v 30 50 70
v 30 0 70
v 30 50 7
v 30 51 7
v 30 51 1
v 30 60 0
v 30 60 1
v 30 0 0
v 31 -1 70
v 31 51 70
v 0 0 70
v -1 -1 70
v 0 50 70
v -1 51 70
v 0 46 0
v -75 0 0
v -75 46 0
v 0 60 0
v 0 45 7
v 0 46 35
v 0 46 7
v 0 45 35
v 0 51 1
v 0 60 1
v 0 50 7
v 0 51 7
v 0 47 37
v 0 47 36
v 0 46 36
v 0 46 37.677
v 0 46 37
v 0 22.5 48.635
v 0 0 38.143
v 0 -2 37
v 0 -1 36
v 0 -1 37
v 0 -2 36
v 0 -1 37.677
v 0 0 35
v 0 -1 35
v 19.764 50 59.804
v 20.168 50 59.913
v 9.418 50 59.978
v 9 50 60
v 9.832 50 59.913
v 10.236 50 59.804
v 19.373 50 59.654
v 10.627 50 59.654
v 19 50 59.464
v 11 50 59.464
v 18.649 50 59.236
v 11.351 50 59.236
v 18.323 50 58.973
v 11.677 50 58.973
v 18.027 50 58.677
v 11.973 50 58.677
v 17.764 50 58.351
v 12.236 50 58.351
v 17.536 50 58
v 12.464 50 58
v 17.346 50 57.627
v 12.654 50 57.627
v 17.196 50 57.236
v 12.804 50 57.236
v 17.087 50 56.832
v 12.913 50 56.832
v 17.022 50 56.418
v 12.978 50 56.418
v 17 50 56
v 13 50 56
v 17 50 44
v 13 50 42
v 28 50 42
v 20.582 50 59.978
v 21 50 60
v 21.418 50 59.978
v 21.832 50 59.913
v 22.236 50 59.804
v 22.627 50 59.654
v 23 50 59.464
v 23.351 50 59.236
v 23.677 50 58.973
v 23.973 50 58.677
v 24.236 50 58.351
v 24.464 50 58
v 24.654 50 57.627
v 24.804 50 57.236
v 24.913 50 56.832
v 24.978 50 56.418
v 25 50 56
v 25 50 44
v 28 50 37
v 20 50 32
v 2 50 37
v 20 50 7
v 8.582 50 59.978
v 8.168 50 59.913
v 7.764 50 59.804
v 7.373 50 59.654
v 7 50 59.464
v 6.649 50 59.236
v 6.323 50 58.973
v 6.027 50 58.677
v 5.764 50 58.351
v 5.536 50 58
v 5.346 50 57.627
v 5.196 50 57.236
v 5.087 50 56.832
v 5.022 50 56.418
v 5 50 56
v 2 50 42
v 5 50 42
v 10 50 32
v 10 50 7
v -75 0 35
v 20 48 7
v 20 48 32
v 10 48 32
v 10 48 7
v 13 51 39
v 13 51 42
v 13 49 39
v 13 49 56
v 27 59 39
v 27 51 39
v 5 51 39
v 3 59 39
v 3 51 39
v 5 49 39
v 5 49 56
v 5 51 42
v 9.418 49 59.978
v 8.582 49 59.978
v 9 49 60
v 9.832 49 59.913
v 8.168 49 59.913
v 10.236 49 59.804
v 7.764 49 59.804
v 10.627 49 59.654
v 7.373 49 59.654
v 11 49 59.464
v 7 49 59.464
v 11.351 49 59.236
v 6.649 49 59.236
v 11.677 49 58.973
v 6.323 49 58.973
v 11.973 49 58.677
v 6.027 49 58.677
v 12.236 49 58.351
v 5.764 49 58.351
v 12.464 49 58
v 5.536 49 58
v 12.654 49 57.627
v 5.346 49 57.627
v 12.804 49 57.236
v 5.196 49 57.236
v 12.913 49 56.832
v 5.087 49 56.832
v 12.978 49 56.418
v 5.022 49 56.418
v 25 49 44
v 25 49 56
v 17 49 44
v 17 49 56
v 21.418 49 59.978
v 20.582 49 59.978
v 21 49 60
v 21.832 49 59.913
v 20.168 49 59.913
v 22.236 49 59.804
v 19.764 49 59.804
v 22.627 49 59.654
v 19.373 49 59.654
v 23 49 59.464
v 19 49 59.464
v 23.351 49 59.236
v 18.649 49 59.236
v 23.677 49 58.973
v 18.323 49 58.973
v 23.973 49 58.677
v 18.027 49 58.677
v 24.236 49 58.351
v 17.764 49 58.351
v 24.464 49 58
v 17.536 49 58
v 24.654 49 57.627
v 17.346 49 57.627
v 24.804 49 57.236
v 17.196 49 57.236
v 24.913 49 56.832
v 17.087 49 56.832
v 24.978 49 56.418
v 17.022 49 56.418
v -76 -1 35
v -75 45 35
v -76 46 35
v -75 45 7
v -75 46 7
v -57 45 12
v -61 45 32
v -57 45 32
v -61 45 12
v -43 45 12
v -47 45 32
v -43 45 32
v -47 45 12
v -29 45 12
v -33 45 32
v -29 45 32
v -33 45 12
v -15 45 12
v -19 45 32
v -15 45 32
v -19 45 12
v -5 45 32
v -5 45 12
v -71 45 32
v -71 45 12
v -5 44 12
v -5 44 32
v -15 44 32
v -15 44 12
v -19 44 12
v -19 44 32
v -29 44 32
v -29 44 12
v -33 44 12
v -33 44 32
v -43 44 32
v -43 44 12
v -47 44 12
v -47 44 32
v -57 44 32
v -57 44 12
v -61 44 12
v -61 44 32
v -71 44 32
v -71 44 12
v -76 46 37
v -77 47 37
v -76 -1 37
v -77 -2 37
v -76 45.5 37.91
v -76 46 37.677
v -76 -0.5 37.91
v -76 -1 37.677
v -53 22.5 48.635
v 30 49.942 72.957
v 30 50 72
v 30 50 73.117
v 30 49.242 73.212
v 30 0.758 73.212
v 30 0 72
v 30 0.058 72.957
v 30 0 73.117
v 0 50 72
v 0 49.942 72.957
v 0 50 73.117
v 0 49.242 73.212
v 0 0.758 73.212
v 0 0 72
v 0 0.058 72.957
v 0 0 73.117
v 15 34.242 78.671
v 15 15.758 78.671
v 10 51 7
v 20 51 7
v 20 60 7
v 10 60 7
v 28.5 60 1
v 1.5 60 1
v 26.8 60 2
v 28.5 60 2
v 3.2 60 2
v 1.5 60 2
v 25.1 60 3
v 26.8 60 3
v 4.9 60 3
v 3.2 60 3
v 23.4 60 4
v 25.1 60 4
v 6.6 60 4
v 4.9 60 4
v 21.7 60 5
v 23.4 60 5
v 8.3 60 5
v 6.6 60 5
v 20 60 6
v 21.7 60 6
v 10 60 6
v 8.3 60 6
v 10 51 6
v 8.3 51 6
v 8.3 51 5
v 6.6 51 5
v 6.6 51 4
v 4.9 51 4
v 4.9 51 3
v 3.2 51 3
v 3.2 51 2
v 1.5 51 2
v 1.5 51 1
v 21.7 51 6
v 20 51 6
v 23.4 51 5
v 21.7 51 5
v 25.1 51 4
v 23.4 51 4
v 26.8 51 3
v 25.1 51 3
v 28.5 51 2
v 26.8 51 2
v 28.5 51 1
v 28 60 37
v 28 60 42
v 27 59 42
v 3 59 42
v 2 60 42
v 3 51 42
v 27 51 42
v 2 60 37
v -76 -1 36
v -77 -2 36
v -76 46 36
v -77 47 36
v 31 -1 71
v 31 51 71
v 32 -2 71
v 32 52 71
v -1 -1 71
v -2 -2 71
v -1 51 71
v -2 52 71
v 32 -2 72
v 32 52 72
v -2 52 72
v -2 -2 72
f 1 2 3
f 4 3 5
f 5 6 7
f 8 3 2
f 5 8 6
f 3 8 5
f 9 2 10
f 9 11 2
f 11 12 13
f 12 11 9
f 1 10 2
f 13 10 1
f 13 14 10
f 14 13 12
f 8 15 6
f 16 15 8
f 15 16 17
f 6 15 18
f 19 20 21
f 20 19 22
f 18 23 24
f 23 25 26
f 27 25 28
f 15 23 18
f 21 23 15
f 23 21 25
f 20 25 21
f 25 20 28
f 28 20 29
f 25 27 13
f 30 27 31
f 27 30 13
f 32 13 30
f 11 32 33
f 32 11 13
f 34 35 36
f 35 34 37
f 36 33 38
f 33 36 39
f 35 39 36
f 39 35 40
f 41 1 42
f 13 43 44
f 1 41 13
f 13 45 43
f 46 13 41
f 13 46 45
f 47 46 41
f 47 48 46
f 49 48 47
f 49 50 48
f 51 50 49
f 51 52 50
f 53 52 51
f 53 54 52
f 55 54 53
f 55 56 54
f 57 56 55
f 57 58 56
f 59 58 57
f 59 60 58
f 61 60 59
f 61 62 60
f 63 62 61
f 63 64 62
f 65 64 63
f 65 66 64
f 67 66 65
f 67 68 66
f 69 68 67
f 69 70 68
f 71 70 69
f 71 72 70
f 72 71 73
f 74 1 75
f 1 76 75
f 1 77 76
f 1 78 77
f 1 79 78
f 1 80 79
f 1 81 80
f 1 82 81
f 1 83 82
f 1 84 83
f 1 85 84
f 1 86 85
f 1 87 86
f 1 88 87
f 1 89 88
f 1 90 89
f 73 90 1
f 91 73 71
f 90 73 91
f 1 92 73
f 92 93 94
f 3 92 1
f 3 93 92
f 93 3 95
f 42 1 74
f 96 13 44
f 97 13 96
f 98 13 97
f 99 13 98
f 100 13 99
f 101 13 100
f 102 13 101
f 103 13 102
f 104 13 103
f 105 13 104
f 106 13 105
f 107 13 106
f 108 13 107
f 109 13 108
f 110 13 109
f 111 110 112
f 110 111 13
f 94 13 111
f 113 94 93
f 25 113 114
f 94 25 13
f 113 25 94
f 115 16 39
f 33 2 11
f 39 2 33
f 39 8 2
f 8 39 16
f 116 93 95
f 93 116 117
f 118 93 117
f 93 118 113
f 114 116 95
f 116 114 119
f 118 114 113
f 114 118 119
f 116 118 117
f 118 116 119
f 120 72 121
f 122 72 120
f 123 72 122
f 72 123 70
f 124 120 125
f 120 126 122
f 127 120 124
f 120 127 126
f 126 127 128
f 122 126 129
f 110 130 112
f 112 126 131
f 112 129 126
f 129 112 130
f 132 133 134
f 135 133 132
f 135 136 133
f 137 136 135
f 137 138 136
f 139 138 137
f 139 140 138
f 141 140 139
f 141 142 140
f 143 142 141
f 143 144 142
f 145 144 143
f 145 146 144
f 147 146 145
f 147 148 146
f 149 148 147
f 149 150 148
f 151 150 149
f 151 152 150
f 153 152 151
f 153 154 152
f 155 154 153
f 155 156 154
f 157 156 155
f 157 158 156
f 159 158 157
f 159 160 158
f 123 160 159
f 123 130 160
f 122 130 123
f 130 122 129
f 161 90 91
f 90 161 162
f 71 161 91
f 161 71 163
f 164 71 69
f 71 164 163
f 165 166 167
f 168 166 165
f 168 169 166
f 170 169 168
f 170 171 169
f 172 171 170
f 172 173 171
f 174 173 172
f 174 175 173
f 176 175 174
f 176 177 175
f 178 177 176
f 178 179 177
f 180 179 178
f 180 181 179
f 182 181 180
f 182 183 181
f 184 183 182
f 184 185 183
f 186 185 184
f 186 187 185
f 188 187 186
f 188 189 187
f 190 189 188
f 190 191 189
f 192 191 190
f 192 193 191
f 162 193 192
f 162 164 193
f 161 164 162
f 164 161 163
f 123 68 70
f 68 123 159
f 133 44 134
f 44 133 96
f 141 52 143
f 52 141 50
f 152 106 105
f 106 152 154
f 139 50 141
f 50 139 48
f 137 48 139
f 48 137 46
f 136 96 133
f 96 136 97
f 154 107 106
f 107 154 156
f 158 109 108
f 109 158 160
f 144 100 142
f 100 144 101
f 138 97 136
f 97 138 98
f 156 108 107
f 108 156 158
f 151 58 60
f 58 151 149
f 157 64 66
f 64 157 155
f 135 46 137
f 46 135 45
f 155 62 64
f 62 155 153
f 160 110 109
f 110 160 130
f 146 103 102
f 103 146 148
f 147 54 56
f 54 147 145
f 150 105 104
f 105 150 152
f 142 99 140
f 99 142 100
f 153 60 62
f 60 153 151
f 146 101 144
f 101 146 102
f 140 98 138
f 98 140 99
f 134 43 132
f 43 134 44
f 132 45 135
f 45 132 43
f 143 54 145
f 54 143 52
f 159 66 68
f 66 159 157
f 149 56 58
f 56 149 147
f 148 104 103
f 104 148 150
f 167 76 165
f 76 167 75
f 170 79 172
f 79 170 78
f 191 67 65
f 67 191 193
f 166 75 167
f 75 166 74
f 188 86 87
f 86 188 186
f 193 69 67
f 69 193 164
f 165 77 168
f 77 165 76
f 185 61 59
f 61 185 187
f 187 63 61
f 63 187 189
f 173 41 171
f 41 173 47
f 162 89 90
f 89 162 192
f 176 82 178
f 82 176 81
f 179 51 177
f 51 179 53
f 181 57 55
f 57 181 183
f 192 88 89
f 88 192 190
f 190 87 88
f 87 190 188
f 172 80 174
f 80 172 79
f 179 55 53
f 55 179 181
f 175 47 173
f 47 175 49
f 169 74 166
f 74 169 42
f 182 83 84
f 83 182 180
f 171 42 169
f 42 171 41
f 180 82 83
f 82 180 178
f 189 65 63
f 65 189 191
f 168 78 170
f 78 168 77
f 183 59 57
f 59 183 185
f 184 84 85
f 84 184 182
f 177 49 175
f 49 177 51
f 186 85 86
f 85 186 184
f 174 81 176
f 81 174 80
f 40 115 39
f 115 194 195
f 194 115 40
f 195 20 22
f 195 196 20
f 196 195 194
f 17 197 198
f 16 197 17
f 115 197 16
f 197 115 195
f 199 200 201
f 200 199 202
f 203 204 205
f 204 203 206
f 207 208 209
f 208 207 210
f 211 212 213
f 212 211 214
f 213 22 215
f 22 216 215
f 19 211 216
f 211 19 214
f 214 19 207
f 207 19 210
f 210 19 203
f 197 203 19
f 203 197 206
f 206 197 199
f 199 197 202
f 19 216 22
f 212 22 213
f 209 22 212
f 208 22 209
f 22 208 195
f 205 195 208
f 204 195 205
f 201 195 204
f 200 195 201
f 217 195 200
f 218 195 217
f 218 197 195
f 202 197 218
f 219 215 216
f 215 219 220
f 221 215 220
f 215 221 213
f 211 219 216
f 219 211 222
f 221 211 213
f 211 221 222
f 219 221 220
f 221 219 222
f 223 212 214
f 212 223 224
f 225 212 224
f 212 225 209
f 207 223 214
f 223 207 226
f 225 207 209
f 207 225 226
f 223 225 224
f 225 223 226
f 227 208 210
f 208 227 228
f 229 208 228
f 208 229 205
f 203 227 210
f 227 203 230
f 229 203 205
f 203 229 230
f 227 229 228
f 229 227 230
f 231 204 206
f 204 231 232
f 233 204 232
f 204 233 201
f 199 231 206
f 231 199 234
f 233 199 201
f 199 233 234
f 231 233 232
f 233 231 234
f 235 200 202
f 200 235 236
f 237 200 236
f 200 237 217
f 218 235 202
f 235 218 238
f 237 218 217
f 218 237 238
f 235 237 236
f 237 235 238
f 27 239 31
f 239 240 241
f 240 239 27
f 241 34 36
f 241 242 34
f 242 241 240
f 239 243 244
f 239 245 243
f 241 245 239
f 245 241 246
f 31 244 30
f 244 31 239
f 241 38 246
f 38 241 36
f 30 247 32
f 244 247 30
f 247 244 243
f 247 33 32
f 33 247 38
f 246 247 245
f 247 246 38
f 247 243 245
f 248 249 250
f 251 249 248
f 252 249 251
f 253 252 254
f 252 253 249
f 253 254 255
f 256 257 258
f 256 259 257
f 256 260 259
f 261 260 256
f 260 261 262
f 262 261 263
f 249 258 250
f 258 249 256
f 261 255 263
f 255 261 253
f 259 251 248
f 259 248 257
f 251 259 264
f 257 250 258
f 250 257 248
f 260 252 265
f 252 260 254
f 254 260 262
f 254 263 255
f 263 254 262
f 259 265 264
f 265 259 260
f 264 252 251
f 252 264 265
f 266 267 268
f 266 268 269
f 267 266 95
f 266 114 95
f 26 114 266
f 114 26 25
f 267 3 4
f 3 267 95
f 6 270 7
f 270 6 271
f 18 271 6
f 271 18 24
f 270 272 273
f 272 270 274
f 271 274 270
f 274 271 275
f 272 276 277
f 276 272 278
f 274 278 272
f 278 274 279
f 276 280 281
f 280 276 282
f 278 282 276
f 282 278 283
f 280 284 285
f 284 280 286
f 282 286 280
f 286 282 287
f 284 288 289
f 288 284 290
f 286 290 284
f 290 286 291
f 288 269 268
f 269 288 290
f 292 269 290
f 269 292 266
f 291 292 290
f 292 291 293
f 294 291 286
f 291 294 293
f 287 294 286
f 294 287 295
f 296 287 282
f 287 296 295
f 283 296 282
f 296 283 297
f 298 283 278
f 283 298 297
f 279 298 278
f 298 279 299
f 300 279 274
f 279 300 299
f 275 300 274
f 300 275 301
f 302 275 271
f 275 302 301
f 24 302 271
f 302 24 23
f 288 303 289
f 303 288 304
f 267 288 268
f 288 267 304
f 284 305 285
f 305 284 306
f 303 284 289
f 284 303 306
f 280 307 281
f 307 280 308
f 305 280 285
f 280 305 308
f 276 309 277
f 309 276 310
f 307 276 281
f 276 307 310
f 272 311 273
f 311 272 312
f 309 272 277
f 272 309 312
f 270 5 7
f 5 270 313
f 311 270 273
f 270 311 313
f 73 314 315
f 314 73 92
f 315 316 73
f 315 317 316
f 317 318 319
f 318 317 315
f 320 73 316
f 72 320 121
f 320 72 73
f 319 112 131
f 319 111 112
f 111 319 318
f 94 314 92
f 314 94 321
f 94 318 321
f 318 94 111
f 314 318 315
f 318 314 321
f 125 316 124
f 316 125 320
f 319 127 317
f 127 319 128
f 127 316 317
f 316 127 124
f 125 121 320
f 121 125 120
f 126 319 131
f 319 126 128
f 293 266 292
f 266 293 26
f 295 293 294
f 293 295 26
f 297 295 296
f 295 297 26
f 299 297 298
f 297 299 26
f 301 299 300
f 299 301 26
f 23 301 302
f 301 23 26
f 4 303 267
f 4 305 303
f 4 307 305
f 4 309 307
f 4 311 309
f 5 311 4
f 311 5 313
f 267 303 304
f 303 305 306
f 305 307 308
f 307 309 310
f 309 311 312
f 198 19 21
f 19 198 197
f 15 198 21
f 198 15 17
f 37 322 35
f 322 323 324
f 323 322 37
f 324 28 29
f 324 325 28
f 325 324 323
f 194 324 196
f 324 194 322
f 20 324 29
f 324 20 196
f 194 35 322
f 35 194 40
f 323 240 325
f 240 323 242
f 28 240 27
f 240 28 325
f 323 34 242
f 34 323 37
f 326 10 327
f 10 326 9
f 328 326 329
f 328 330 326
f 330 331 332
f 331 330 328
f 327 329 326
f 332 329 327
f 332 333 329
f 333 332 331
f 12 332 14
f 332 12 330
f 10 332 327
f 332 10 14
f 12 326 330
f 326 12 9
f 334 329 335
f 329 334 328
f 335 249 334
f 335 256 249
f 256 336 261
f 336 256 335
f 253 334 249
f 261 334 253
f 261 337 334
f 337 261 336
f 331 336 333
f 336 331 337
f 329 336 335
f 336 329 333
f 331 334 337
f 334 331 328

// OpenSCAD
$fs=0.25;$fa=6;
union() {
difference(){translate([15,25,35])cube([30,50,70],center=true);
translate([15,49.5,19.5])cube([10,3,25],center=true);
translate([9,50,47.5])cube([8,2,17],center=true);
translate([21,50,50])cube([8,2,12],center=true);
translate([9,50.5,56])rotate([-90,0,0])cylinder(h=3, r=4, center=true);
translate([21,50.5,56])rotate([-90,0,0])cylinder(h=3, r=4, center=true);
}difference(){translate([-37.5,22.5,17.5])cube([75,45,35],center=true);
translate([-10,45,22])cube([10,2,20],center=true);
translate([-24,45,22])cube([10,2,20],center=true);
translate([-38,45,22])cube([10,2,20],center=true);
translate([-52,45,22])cube([10,2,20],center=true);
translate([-66,45,22])cube([10,2,20],center=true);
}translate([15,50.5,3.5])cube([30,1,7],center=true);
translate([-37.5,45.5,3.5])cube([75,1,7],center=true);
translate([-38,22.5,35.5])cube([76,47,1],center=true);
translate([-38.5,22.5,36.5])cube([77,49,1],center=true);
translate([15,25,70.5])cube([32,52,1],center=true);
translate([15,25,71.5])cube([34,54,1],center=true);
difference(){translate([-38,22.5,44.5])cube([76,47,15],center=true);
translate([-38,39.5,54.5])rotate([-25,0,0])cube([78,47,25],center=true);
translate([-38,5.5,54.5])rotate([25,0,0])cube([78,47,25],center=true);
translate([-70,22.5,54.5])rotate([0,-25,0])cube([78,47,25],center=true);
}difference(){translate([15,25,80])cube([30,50,20],center=true);
translate([15,35,105])rotate([-20,0,0])cube([32,50,50],center=true);
translate([15,15,105])rotate([20,0,0])cube([32,50,50],center=true);
translate([6,25,102])rotate([0,-20,0])cube([32,50,50],center=true);
translate([24,25,102])rotate([0,20,0])cube([32,50,50],center=true);
}difference(){translate([15,55,3.5])cube([30,10,7],center=true);
translate([4.5,55.5,7])cube([11,11,2],center=true);
translate([3.65,55.5,6])cube([9.3,11,2],center=true);
translate([2.8,55.5,5])cube([7.6,11,2],center=true);
translate([1.95,55.5,4])cube([5.9,11,2],center=true);
translate([1.1,55.5,3])cube([4.2,11,2],center=true);
translate([0.25,55.5,2])cube([2.5,11,2],center=true);
translate([25.5,55.5,7])cube([11,11,2],center=true);
translate([27.2,55.5,6])cube([11,11,2],center=true);
translate([28.9,55.5,5])cube([11,11,2],center=true);
translate([30.6,55.5,4])cube([11,11,2],center=true);
translate([32.3,55.5,3])cube([11,11,2],center=true);
translate([34,55.5,2])cube([11,11,2],center=true);
}difference(){translate([15,55,39.5])cube([26,10,5],center=true);
translate([15,55,41])cube([24,8,4],center=true);
translate([9,50.5,41])cube([8,3,4],center=true);
}}
